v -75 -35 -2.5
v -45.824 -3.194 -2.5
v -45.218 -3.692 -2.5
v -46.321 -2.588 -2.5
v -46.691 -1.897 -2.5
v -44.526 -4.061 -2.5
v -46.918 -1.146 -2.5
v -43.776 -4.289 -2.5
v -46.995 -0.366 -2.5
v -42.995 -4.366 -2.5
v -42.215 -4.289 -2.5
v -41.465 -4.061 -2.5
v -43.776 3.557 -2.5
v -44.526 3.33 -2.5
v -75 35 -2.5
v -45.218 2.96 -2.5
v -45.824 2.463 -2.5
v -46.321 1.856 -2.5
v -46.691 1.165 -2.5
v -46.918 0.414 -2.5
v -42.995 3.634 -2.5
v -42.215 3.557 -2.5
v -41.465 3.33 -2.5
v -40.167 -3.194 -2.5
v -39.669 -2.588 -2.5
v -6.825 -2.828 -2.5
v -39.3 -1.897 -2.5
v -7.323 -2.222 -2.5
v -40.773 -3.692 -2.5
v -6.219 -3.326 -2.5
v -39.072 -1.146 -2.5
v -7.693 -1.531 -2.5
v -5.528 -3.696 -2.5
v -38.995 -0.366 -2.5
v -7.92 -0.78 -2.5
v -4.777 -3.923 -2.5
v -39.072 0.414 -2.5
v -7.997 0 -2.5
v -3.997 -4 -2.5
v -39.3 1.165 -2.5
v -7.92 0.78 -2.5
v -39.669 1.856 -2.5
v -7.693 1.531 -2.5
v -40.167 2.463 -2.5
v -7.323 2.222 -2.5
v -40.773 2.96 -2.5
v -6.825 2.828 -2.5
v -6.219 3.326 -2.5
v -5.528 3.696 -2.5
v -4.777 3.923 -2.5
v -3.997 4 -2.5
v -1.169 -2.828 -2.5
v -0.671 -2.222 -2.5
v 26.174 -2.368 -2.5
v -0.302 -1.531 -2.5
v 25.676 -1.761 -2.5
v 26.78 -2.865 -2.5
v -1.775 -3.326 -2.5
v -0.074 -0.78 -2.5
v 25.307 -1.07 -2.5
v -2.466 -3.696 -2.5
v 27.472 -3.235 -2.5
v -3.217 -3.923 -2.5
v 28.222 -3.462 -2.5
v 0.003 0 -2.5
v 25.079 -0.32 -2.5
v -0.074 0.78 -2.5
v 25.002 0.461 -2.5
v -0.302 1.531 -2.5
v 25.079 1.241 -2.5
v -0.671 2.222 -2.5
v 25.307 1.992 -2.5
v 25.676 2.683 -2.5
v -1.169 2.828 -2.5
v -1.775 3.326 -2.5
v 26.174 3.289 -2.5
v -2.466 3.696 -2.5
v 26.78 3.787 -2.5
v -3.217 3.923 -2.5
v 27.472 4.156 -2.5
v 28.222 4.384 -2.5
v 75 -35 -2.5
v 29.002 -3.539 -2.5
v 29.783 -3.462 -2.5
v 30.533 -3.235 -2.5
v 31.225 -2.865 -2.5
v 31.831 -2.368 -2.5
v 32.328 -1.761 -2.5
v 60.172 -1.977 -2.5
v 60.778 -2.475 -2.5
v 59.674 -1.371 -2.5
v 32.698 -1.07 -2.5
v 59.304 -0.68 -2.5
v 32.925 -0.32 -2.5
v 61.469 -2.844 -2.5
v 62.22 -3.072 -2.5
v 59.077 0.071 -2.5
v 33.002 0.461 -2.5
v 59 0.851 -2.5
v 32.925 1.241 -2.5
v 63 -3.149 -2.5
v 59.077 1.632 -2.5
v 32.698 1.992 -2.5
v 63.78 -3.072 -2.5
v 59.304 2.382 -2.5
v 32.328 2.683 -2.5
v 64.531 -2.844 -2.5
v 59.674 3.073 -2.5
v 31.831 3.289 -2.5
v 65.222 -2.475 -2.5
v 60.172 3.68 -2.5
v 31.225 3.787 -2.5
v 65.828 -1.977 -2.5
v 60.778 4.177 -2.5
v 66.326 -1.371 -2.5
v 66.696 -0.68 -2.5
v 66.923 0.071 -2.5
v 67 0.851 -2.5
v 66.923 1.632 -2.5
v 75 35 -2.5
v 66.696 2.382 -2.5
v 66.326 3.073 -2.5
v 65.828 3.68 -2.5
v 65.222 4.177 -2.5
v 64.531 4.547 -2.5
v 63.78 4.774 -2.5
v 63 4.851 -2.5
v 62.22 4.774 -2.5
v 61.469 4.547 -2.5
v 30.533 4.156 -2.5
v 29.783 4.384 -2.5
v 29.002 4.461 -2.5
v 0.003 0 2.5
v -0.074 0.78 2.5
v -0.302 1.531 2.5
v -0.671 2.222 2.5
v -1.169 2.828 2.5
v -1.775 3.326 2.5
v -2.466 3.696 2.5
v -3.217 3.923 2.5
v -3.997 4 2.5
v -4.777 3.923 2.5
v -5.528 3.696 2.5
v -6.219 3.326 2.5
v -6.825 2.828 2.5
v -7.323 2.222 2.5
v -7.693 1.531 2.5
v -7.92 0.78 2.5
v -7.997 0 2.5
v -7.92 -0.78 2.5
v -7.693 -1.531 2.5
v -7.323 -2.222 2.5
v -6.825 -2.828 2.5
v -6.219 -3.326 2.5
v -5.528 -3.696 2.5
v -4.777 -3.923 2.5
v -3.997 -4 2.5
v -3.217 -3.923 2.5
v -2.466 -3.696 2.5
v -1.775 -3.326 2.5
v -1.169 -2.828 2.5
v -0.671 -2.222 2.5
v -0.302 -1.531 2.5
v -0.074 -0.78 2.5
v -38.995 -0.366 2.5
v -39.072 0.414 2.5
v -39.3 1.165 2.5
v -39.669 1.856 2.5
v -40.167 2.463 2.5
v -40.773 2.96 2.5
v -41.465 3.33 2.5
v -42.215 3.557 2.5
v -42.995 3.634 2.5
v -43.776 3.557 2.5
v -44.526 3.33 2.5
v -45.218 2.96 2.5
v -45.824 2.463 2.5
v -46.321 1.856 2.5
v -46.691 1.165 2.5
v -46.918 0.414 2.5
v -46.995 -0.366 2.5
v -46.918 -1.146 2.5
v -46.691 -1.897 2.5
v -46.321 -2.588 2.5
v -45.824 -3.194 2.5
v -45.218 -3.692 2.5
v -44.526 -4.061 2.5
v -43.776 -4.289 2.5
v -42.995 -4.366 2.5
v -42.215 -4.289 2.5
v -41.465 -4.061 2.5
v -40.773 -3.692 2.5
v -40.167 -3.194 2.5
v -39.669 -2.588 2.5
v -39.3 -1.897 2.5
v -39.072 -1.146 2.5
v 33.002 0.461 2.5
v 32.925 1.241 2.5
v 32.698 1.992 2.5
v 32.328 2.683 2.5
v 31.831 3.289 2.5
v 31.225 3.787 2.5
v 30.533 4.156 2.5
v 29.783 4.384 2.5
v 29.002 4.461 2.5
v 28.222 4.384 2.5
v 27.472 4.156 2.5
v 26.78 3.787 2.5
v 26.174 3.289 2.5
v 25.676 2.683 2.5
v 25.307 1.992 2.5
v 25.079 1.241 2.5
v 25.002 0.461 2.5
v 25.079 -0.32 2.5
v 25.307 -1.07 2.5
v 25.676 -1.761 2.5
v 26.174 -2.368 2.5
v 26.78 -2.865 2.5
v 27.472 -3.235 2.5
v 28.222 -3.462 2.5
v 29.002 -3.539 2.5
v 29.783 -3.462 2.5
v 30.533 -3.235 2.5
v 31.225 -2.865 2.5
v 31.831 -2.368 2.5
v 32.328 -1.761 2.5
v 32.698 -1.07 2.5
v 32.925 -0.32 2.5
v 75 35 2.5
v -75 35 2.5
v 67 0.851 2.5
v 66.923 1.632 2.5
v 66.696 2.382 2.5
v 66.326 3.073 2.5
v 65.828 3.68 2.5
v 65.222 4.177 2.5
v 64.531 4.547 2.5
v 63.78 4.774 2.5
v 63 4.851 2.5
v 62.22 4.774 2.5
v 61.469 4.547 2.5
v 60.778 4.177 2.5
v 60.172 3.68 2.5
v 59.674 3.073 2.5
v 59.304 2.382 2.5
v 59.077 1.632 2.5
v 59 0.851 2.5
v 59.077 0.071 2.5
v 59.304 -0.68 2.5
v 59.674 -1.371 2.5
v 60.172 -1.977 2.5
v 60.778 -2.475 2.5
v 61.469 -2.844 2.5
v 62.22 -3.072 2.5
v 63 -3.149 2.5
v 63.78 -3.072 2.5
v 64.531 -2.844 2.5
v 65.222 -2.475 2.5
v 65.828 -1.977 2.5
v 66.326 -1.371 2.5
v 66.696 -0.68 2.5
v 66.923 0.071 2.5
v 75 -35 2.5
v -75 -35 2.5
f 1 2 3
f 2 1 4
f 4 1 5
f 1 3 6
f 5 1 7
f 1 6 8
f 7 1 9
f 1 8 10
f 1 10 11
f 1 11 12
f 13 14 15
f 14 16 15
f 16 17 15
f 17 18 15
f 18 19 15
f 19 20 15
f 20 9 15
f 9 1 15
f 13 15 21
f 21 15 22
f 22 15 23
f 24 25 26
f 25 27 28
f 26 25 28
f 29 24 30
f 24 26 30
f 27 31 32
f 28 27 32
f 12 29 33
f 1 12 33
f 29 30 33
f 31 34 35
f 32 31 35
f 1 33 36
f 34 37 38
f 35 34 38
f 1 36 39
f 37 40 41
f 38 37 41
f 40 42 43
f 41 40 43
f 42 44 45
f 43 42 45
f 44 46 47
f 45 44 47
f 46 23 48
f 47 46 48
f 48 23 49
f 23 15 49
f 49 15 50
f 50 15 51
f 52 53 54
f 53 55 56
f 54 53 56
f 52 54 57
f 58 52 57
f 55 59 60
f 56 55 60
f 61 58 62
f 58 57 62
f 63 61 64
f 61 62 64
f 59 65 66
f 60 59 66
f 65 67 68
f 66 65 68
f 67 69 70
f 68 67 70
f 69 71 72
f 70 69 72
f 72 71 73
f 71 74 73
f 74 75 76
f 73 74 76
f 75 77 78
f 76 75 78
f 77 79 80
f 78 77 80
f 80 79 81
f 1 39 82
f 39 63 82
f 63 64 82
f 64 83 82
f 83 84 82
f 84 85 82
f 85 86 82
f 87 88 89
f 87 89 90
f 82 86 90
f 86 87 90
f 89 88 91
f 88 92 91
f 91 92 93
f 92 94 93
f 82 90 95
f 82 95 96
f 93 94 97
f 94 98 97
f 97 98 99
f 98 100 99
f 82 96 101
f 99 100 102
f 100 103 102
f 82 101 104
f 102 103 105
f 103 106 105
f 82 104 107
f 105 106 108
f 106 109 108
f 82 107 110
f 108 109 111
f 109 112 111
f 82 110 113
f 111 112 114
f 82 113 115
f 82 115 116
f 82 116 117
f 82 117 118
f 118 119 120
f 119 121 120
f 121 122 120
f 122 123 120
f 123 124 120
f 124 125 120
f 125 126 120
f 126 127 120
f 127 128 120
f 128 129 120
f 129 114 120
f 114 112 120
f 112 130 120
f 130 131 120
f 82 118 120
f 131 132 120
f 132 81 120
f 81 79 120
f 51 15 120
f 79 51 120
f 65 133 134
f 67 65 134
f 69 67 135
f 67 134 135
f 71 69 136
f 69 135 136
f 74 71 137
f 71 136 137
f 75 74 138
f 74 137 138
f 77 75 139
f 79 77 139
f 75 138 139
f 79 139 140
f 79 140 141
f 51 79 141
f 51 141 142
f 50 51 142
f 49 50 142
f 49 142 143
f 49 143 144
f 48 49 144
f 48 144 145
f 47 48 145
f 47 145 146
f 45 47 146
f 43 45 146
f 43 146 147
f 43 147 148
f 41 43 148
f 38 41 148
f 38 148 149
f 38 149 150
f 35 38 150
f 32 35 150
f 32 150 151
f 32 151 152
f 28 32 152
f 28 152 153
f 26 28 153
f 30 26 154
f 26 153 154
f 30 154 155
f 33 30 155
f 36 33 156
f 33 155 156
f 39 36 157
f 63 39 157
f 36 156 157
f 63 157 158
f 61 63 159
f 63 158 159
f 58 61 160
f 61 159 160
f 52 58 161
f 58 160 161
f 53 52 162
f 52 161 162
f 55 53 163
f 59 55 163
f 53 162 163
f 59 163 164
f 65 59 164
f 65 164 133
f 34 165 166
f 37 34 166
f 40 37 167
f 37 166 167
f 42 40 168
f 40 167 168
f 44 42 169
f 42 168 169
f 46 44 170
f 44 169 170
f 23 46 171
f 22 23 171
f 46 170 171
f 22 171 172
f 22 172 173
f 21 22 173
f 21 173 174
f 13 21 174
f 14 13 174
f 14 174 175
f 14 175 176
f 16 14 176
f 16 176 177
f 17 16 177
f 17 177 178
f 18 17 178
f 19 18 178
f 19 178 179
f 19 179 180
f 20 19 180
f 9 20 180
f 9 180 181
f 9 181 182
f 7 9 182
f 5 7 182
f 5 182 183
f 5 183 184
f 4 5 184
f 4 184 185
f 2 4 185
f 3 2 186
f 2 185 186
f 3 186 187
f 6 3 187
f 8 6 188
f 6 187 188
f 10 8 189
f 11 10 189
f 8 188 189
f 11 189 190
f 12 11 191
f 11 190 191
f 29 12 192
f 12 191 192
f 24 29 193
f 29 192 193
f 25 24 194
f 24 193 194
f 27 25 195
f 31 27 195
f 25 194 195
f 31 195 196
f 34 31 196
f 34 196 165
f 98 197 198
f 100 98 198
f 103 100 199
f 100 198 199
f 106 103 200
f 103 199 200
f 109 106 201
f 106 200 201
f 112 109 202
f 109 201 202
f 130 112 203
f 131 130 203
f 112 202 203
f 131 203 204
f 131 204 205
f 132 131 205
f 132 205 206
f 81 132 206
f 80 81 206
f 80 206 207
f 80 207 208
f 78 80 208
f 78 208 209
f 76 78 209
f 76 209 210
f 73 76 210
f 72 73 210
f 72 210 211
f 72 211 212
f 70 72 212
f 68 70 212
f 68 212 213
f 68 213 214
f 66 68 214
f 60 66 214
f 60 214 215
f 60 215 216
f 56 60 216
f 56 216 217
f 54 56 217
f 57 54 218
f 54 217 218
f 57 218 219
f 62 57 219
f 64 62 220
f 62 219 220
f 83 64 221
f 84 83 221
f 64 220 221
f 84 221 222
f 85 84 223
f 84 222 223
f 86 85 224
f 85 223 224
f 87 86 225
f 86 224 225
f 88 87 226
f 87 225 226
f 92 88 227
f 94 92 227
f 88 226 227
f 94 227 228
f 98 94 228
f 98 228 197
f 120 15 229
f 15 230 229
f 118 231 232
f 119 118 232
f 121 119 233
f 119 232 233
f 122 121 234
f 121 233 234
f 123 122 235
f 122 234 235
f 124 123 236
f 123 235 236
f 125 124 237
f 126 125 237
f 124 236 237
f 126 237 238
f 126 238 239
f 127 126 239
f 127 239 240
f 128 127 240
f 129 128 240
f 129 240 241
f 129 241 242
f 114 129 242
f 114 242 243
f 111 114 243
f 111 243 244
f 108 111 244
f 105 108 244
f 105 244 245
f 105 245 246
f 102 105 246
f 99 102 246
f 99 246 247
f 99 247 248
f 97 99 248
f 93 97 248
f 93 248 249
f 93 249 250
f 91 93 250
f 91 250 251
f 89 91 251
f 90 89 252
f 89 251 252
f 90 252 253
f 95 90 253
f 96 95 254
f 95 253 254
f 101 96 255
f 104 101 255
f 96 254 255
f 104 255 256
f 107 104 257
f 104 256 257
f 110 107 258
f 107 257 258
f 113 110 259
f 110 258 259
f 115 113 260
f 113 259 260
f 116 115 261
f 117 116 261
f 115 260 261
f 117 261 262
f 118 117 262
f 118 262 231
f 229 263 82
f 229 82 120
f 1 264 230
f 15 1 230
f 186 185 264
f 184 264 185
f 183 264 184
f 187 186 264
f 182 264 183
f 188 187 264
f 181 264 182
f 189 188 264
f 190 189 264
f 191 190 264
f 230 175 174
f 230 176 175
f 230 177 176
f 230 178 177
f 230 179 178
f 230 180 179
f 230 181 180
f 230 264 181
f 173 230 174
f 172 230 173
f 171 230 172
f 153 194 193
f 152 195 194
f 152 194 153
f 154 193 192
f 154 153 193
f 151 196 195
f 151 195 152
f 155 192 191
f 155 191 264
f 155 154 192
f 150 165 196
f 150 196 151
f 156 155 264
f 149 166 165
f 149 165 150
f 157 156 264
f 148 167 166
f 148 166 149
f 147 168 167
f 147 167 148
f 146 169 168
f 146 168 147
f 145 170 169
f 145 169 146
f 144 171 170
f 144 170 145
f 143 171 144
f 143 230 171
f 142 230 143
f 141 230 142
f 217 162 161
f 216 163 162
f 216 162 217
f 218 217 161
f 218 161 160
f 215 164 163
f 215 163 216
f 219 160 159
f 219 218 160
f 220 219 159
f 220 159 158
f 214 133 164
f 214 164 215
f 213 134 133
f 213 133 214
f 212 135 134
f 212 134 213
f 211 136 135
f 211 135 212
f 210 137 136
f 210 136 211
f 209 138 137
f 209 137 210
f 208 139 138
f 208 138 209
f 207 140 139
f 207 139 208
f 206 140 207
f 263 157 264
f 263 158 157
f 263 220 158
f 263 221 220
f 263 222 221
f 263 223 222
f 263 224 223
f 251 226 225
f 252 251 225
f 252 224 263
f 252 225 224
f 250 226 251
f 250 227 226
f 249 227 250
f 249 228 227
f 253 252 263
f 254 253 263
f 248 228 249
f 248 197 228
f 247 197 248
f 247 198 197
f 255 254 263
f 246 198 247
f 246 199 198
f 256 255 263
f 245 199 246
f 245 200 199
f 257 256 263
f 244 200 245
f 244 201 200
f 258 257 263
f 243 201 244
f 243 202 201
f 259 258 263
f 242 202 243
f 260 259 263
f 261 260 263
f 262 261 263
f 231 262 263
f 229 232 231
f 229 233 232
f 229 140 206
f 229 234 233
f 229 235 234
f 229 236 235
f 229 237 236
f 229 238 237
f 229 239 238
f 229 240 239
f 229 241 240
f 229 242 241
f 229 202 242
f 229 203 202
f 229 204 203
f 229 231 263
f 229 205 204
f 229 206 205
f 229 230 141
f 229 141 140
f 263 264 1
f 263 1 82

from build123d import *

# Parameters (mm, degrees)
SKETCH1_W           = 150
SKETCH1_H           = 70
BOSS_EXTRUDE1_DEPTH = 2.5
SKETCH2_R           = 4
CUT_EXTRUDE1_DEPTH  = 6


with BuildPart() as part:
    # Sketch1 → Boss-Extrude1 (new body, symmetric)
    with BuildSketch(Plane.XY):
        Rectangle(SKETCH1_W, SKETCH1_H)
    extrude(amount=BOSS_EXTRUDE1_DEPTH, both=True)

    # Sketch2 → Cut-Extrude1 (cut, through all)
    with BuildSketch(Plane.XY.offset(2.5)):
        with Locations((63, 0.85119924)):
            Circle(SKETCH2_R)
        with Locations((29.002241117, 0.460826454)):
            Circle(SKETCH2_R)
        with Locations((-42.995335398, -0.365871995)):
            Circle(SKETCH2_R)
        with Locations((-3.99705162, 0)):
            Circle(SKETCH2_R)
    extrude(amount=-CUT_EXTRUDE1_DEPTH, mode=Mode.SUBTRACT)


solid = part.part
